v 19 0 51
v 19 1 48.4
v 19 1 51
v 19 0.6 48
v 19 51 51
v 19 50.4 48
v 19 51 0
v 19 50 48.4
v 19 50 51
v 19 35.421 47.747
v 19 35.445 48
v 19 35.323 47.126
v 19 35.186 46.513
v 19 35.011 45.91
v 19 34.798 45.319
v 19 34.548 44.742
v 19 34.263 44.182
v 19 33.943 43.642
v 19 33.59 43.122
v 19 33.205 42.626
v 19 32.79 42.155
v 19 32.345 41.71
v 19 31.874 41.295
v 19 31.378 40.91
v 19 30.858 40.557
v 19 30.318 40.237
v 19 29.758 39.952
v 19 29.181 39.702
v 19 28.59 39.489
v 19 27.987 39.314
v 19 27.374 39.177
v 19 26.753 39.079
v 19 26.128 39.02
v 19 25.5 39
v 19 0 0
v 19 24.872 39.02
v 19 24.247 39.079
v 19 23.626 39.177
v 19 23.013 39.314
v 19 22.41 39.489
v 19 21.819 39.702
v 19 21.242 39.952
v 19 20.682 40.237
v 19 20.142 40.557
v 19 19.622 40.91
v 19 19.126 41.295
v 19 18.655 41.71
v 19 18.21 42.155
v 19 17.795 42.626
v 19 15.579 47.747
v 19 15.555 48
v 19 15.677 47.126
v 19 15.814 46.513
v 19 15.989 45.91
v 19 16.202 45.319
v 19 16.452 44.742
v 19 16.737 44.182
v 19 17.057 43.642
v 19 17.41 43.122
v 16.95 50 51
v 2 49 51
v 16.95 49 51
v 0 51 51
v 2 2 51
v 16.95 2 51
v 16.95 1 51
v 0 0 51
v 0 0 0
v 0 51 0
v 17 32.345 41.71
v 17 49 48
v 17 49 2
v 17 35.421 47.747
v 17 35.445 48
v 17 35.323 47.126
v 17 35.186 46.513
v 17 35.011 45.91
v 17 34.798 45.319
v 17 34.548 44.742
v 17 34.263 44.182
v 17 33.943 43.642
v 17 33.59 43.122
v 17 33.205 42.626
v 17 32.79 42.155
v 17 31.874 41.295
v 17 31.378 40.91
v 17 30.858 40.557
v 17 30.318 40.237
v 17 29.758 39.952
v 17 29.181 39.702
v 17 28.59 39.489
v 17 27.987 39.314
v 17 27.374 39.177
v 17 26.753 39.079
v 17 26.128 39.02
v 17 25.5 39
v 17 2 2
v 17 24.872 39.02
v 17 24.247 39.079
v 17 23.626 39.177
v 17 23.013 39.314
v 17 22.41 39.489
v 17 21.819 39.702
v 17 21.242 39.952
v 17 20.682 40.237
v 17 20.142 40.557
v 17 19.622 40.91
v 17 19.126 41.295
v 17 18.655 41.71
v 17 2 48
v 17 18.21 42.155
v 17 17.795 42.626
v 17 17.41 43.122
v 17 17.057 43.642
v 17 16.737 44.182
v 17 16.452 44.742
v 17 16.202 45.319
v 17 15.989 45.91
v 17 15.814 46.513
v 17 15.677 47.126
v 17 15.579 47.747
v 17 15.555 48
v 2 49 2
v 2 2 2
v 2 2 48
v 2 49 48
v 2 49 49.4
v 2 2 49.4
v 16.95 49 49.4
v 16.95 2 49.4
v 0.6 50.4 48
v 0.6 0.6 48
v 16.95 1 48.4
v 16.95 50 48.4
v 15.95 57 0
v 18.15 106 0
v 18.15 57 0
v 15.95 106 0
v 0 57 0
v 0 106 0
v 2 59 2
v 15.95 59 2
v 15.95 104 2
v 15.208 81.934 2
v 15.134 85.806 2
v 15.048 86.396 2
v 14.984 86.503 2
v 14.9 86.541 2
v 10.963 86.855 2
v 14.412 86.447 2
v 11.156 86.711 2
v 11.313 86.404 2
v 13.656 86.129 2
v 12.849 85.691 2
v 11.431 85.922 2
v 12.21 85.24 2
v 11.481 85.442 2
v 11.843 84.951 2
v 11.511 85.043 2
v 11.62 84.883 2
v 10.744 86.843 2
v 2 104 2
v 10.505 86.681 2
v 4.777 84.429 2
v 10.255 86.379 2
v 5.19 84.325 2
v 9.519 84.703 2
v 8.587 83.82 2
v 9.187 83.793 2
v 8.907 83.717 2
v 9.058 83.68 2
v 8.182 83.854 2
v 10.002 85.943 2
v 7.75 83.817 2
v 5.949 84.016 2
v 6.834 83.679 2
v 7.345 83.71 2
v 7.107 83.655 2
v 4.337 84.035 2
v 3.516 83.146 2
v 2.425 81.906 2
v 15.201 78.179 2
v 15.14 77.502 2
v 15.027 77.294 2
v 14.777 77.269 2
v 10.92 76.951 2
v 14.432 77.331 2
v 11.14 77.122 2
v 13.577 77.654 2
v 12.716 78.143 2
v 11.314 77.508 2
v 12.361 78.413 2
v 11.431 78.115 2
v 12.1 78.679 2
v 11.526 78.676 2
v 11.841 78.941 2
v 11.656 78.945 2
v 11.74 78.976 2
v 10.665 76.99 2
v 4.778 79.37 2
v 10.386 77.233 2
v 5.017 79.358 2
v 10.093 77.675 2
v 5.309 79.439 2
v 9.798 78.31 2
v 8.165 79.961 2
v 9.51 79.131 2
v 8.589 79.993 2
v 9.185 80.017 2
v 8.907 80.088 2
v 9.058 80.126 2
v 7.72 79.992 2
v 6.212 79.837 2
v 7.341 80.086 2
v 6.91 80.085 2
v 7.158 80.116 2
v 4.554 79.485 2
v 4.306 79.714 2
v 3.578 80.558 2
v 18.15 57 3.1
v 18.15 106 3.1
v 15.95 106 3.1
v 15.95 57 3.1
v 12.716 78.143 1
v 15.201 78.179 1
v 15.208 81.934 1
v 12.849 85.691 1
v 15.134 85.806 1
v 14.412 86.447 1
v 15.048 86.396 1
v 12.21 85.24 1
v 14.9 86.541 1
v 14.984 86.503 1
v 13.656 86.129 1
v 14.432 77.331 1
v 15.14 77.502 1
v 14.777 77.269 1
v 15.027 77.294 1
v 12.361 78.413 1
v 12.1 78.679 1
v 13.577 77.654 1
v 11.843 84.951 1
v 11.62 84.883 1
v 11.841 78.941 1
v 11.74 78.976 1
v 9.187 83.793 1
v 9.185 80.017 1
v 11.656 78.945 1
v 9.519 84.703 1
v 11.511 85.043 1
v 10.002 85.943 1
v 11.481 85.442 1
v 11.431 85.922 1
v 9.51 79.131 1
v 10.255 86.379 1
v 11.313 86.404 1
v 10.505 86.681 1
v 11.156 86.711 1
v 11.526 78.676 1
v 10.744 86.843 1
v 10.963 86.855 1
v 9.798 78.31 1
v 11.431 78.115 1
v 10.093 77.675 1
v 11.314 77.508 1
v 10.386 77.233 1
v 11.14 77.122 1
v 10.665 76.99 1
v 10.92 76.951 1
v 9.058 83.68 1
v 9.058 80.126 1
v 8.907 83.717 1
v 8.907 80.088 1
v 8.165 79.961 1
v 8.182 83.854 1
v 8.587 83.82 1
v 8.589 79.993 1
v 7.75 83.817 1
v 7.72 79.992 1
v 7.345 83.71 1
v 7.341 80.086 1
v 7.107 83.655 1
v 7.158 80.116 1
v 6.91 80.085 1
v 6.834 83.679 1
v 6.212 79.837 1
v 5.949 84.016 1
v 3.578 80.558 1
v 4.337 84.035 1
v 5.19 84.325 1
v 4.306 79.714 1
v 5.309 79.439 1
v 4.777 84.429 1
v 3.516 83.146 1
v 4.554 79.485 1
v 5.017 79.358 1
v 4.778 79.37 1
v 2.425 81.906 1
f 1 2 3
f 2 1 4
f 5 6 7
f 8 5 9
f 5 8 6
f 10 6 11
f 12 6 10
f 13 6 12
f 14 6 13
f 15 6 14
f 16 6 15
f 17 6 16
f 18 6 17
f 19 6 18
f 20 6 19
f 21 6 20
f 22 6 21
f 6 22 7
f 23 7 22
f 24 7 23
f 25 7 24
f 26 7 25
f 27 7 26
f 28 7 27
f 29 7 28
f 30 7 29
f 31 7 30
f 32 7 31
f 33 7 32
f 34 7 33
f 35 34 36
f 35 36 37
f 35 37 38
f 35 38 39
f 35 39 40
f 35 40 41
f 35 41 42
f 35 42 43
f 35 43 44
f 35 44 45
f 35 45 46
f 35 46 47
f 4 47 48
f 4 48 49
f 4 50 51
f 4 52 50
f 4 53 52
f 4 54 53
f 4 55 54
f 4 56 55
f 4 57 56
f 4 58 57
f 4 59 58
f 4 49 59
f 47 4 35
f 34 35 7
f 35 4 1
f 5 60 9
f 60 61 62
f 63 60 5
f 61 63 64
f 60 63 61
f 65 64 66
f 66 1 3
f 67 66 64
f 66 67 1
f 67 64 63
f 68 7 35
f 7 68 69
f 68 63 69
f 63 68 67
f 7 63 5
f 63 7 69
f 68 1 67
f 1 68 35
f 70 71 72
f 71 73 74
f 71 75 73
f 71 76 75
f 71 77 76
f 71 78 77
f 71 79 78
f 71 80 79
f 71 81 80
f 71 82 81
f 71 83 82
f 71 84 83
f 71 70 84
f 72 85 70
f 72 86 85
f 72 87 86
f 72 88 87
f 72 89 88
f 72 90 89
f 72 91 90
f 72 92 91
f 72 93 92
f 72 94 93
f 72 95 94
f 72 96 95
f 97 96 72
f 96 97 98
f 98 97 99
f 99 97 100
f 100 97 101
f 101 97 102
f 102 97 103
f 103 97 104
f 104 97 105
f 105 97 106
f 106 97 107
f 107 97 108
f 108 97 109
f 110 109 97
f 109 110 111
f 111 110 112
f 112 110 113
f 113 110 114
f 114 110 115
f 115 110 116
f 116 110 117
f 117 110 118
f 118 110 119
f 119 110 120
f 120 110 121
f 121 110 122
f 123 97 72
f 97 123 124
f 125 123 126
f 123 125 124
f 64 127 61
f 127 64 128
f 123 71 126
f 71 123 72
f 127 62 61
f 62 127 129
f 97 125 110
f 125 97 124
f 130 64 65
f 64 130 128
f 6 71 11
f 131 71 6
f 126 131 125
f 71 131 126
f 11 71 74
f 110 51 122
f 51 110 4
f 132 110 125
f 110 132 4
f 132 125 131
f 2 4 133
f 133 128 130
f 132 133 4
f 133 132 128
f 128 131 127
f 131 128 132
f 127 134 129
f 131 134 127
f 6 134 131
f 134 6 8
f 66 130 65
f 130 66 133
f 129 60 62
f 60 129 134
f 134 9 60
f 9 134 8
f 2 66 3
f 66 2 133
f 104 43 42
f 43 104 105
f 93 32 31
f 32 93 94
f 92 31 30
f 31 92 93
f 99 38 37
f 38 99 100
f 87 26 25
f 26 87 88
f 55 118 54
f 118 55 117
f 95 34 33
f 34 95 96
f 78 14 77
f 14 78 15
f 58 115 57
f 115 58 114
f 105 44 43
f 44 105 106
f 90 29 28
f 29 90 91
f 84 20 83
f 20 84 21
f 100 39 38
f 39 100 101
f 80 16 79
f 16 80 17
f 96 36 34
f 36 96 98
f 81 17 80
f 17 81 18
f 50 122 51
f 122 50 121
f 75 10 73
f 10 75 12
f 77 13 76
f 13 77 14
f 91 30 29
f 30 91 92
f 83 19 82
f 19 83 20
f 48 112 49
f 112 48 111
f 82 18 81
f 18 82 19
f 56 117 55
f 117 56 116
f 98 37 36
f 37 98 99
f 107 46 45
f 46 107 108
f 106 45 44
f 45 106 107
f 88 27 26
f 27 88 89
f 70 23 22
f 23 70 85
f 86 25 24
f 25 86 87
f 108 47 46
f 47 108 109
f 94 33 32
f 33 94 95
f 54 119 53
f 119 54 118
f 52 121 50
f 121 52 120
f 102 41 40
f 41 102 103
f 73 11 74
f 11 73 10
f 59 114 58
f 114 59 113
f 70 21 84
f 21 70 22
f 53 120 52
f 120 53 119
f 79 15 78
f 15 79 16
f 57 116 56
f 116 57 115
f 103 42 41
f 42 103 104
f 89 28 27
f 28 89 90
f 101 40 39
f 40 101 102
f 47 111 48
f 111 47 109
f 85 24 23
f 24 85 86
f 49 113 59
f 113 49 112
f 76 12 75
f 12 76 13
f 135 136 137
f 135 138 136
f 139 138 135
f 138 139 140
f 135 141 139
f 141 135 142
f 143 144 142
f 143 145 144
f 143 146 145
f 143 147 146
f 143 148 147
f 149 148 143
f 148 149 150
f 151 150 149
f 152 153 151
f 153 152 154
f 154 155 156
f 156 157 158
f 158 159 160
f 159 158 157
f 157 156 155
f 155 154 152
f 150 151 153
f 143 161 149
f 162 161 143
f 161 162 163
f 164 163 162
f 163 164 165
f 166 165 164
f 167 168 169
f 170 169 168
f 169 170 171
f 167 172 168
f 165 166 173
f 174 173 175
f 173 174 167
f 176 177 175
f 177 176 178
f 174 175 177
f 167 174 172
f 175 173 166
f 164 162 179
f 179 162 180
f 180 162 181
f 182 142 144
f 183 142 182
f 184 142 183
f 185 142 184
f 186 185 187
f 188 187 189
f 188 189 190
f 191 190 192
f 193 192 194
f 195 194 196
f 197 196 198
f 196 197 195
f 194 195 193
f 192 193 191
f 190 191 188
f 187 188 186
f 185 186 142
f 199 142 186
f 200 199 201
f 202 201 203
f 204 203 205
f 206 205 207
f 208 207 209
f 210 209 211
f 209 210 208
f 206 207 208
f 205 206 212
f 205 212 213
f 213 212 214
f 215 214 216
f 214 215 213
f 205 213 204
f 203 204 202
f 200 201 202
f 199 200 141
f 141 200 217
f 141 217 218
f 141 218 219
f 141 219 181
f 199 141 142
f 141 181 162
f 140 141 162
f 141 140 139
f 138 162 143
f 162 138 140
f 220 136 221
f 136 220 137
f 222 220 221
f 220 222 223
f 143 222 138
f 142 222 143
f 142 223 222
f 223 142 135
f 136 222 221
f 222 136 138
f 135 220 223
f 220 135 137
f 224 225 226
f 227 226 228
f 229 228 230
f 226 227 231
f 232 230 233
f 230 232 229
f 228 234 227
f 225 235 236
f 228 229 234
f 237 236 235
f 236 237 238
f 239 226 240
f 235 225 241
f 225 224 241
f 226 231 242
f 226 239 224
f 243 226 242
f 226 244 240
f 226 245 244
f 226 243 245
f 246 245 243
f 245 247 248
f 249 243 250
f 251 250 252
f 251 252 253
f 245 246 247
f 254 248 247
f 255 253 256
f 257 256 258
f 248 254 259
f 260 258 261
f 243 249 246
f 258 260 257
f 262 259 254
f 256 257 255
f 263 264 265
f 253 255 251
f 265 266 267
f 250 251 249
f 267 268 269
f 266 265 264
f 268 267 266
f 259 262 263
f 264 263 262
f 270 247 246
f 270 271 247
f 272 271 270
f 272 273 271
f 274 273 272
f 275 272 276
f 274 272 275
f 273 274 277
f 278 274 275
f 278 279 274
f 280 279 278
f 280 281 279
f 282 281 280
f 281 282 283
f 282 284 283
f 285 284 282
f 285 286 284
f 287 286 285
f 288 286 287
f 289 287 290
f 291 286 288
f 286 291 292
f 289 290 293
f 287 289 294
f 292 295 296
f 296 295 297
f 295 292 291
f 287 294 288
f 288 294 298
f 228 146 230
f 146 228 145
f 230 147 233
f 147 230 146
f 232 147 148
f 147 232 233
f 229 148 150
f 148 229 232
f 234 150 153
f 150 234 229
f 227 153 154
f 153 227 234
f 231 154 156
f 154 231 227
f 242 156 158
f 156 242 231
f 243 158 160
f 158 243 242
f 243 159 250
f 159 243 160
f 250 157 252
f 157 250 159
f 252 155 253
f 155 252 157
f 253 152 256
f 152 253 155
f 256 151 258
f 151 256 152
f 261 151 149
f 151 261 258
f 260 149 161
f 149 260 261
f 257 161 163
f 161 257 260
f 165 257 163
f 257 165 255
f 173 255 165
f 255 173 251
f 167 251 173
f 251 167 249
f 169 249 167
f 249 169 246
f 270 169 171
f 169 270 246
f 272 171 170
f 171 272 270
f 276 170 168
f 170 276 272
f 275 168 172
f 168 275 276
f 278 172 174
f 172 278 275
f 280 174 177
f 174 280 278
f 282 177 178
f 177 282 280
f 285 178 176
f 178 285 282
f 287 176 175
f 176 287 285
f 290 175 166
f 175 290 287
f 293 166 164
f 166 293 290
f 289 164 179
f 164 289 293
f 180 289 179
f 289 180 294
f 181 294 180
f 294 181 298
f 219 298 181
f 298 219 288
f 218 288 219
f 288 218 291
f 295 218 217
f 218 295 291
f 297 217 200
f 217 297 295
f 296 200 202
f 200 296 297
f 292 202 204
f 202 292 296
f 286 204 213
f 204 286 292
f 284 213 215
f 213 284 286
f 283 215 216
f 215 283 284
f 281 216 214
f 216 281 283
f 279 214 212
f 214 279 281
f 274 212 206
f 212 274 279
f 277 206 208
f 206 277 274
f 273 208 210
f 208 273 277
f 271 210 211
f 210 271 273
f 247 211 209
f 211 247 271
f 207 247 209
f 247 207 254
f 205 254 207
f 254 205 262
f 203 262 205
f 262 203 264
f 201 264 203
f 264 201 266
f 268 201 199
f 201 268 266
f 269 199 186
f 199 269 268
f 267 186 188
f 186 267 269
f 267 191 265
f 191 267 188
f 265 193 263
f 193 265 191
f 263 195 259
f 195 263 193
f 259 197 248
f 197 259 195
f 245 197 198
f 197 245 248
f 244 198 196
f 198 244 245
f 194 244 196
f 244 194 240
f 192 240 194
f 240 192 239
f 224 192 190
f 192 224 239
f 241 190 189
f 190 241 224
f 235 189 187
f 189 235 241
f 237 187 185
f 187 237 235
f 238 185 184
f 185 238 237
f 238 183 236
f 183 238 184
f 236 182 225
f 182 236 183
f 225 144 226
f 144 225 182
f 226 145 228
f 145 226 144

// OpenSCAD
// file: carcassonne_box.scad
/**
 * @file carcassonne_box.scad
 * @author Conlan Wesson (modified by [Your Name])
 * Template for Carcassonne boxes.
 * @copyright Creative Commons Attribution-NonCommercial-ShareAlike 4.0
 */

mm = 1;
cm = 10*mm;

tiles = 2*mm;
clearance = 3*mm;

width = 47*mm;
thick = 2.5*mm;
wall = 2*mm;

/**
 * Lid for box.
 * @param sections Array of section lengths.
 * @param columns Number of columns.
 * @param icon Path to icon DXF file.
 * @param rot Icon rotation in degrees.
 * @param mult Icon scale.
 * @param xoff X-offset of icon from center.
 * @param yoff Y-offset of icon from center.
 */
module carcassonne_lid(sections, columns=1, icon=false, icon2=false, icon3=false, rot=0, mult=1, xoff=0, yoff=0, mult2=1, xoff2=0, yoff2=0, mult3=1, xoff3=0, yoff3=0, g=0){
    divider_thickness = wall/2;
    length = sum(sections) + (divider_thickness * (len(sections) - 1));
    w = length+(1.5*wall)+.1;
    l = (width*columns)+wall;
    h = wall;
    d = 2;

    CubePoints = [
        [ 0-g, 0-g,   0 ],  //0
        [ w+g, 0-g,   0 ],  //1
        [ w+g, l+g,   0 ],  //2
        [ 0-g, l+g,   0 ],  //3
        [   d,   d, h+g ],  //4
        [   w,   d, h+g ],  //5
        [   w, l-d, h+g ],  //6
        [   d, l-d, h+g ]   //7
    ];

    CubeFaces = [
        [0,1,2,3],  // bottom
        [4,5,1,0],  // front
        [7,6,5,4],  // top
        [5,6,2,1],  // right
        [6,7,3,2],  // back
        [7,4,0,3]   // left
    ];

    difference(){
        union(){
            polyhedron( CubePoints, CubeFaces );
            translate([w-wall-.15,0,0]) cube([wall+.2,l, (1.5*wall)+.1]);
        }
        if(icon){
            translate([w/2+xoff,l/3+yoff,h-(wall/2)]){
                linear_extrude(height=(wall)+.1){
                    rotate(rot) scale(mult) import(icon);
                }
            }
        }
        if(icon2){
            translate([w/2+xoff2,l/3+yoff2,h-(wall/2)]){
                linear_extrude(height=(wall)+.1){
                    rotate(rot) scale(mult2) import(icon2);
                }
            }
        }
        if(icon3){
            translate([w/2+xoff3,l/3+yoff3,h-(wall/2)]){
                linear_extrude(height=(wall)+.1){
                    rotate(rot) scale(mult3) import(icon3);
                }
            }
        }
    }
}

/**
 * Carcassonne card box.
 * @param sections Array of section lengths.
 * @param columns Number of columns.
 */
module carcassonne_box(sections, columns=1){
    divider_thickness = wall/2;
    raw_length = sum(sections) + (divider_thickness * (len(sections) - 1));
    length = raw_length;

    section_count = len(sections);

    difference(){
        union(){
            difference(){
                // Outer walls
                cube([length+(2*wall), (width*columns)+(2*wall), width+(2*wall)]);
                // Cavity
                translate([wall, wall, wall]){
                    cube([length, width*columns, (width+wall)+.1]);
                }
            }
            // Dividers
            for(col = [0:columns-1]){
                divider_positions = [for(i=0; i<len(sections)-1; i=i+1) 
                    sum([for(j=[0:i]) sections[j]]) + (i * divider_thickness)];
                for(pos = divider_positions){
                    translate([pos+wall, width*col+wall, 0]) 
                        cube([divider_thickness, width, width-(2*wall)]);
                }
                if(col > 0){
                    translate([0, width*col+(wall/2), 0]) 
                        cube([length+(2*wall)-18.0, wall/2, width-(2*wall)]);
                }
            }
        }
        union(){
            // Notch
            for(col = [0:columns-1]){
                translate([wall, wall+(width*col), wall]){
                    translate([0, width/2, width])
                    rotate([0, 90, 0]){
                        cylinder(r=10, h=length+(2*wall), $fn=100);
                    }
                }
            }
            // Track
            translate([wall/2, wall/2, width+wall-1])
                carcassonne_lid(sections, columns, g=0.4);
        }
    }
}


// Helper function to sum an array
function sum(v, i = 0, r = 0) = i < len(v) ? sum(v, i + 1, r + v[i]) : r;
// main file
/**
 * @file bets.scad
 * @author Andrew Hargrave
 * The Bets Carcossonne box.
 * @copyright Creative Commons Attribution-NonCommercial-ShareAlike 4.0
 */

include <carcassonne_box.scad>

sections = [15 * mm];
columns = 1;
icon="0-abbot.dxf";

carcassonne_box(sections, columns);
translate([0,width*columns+10,0]) carcassonne_lid(sections, columns, icon, rot=90, mult=.4, xoff=8, yoff=3);
